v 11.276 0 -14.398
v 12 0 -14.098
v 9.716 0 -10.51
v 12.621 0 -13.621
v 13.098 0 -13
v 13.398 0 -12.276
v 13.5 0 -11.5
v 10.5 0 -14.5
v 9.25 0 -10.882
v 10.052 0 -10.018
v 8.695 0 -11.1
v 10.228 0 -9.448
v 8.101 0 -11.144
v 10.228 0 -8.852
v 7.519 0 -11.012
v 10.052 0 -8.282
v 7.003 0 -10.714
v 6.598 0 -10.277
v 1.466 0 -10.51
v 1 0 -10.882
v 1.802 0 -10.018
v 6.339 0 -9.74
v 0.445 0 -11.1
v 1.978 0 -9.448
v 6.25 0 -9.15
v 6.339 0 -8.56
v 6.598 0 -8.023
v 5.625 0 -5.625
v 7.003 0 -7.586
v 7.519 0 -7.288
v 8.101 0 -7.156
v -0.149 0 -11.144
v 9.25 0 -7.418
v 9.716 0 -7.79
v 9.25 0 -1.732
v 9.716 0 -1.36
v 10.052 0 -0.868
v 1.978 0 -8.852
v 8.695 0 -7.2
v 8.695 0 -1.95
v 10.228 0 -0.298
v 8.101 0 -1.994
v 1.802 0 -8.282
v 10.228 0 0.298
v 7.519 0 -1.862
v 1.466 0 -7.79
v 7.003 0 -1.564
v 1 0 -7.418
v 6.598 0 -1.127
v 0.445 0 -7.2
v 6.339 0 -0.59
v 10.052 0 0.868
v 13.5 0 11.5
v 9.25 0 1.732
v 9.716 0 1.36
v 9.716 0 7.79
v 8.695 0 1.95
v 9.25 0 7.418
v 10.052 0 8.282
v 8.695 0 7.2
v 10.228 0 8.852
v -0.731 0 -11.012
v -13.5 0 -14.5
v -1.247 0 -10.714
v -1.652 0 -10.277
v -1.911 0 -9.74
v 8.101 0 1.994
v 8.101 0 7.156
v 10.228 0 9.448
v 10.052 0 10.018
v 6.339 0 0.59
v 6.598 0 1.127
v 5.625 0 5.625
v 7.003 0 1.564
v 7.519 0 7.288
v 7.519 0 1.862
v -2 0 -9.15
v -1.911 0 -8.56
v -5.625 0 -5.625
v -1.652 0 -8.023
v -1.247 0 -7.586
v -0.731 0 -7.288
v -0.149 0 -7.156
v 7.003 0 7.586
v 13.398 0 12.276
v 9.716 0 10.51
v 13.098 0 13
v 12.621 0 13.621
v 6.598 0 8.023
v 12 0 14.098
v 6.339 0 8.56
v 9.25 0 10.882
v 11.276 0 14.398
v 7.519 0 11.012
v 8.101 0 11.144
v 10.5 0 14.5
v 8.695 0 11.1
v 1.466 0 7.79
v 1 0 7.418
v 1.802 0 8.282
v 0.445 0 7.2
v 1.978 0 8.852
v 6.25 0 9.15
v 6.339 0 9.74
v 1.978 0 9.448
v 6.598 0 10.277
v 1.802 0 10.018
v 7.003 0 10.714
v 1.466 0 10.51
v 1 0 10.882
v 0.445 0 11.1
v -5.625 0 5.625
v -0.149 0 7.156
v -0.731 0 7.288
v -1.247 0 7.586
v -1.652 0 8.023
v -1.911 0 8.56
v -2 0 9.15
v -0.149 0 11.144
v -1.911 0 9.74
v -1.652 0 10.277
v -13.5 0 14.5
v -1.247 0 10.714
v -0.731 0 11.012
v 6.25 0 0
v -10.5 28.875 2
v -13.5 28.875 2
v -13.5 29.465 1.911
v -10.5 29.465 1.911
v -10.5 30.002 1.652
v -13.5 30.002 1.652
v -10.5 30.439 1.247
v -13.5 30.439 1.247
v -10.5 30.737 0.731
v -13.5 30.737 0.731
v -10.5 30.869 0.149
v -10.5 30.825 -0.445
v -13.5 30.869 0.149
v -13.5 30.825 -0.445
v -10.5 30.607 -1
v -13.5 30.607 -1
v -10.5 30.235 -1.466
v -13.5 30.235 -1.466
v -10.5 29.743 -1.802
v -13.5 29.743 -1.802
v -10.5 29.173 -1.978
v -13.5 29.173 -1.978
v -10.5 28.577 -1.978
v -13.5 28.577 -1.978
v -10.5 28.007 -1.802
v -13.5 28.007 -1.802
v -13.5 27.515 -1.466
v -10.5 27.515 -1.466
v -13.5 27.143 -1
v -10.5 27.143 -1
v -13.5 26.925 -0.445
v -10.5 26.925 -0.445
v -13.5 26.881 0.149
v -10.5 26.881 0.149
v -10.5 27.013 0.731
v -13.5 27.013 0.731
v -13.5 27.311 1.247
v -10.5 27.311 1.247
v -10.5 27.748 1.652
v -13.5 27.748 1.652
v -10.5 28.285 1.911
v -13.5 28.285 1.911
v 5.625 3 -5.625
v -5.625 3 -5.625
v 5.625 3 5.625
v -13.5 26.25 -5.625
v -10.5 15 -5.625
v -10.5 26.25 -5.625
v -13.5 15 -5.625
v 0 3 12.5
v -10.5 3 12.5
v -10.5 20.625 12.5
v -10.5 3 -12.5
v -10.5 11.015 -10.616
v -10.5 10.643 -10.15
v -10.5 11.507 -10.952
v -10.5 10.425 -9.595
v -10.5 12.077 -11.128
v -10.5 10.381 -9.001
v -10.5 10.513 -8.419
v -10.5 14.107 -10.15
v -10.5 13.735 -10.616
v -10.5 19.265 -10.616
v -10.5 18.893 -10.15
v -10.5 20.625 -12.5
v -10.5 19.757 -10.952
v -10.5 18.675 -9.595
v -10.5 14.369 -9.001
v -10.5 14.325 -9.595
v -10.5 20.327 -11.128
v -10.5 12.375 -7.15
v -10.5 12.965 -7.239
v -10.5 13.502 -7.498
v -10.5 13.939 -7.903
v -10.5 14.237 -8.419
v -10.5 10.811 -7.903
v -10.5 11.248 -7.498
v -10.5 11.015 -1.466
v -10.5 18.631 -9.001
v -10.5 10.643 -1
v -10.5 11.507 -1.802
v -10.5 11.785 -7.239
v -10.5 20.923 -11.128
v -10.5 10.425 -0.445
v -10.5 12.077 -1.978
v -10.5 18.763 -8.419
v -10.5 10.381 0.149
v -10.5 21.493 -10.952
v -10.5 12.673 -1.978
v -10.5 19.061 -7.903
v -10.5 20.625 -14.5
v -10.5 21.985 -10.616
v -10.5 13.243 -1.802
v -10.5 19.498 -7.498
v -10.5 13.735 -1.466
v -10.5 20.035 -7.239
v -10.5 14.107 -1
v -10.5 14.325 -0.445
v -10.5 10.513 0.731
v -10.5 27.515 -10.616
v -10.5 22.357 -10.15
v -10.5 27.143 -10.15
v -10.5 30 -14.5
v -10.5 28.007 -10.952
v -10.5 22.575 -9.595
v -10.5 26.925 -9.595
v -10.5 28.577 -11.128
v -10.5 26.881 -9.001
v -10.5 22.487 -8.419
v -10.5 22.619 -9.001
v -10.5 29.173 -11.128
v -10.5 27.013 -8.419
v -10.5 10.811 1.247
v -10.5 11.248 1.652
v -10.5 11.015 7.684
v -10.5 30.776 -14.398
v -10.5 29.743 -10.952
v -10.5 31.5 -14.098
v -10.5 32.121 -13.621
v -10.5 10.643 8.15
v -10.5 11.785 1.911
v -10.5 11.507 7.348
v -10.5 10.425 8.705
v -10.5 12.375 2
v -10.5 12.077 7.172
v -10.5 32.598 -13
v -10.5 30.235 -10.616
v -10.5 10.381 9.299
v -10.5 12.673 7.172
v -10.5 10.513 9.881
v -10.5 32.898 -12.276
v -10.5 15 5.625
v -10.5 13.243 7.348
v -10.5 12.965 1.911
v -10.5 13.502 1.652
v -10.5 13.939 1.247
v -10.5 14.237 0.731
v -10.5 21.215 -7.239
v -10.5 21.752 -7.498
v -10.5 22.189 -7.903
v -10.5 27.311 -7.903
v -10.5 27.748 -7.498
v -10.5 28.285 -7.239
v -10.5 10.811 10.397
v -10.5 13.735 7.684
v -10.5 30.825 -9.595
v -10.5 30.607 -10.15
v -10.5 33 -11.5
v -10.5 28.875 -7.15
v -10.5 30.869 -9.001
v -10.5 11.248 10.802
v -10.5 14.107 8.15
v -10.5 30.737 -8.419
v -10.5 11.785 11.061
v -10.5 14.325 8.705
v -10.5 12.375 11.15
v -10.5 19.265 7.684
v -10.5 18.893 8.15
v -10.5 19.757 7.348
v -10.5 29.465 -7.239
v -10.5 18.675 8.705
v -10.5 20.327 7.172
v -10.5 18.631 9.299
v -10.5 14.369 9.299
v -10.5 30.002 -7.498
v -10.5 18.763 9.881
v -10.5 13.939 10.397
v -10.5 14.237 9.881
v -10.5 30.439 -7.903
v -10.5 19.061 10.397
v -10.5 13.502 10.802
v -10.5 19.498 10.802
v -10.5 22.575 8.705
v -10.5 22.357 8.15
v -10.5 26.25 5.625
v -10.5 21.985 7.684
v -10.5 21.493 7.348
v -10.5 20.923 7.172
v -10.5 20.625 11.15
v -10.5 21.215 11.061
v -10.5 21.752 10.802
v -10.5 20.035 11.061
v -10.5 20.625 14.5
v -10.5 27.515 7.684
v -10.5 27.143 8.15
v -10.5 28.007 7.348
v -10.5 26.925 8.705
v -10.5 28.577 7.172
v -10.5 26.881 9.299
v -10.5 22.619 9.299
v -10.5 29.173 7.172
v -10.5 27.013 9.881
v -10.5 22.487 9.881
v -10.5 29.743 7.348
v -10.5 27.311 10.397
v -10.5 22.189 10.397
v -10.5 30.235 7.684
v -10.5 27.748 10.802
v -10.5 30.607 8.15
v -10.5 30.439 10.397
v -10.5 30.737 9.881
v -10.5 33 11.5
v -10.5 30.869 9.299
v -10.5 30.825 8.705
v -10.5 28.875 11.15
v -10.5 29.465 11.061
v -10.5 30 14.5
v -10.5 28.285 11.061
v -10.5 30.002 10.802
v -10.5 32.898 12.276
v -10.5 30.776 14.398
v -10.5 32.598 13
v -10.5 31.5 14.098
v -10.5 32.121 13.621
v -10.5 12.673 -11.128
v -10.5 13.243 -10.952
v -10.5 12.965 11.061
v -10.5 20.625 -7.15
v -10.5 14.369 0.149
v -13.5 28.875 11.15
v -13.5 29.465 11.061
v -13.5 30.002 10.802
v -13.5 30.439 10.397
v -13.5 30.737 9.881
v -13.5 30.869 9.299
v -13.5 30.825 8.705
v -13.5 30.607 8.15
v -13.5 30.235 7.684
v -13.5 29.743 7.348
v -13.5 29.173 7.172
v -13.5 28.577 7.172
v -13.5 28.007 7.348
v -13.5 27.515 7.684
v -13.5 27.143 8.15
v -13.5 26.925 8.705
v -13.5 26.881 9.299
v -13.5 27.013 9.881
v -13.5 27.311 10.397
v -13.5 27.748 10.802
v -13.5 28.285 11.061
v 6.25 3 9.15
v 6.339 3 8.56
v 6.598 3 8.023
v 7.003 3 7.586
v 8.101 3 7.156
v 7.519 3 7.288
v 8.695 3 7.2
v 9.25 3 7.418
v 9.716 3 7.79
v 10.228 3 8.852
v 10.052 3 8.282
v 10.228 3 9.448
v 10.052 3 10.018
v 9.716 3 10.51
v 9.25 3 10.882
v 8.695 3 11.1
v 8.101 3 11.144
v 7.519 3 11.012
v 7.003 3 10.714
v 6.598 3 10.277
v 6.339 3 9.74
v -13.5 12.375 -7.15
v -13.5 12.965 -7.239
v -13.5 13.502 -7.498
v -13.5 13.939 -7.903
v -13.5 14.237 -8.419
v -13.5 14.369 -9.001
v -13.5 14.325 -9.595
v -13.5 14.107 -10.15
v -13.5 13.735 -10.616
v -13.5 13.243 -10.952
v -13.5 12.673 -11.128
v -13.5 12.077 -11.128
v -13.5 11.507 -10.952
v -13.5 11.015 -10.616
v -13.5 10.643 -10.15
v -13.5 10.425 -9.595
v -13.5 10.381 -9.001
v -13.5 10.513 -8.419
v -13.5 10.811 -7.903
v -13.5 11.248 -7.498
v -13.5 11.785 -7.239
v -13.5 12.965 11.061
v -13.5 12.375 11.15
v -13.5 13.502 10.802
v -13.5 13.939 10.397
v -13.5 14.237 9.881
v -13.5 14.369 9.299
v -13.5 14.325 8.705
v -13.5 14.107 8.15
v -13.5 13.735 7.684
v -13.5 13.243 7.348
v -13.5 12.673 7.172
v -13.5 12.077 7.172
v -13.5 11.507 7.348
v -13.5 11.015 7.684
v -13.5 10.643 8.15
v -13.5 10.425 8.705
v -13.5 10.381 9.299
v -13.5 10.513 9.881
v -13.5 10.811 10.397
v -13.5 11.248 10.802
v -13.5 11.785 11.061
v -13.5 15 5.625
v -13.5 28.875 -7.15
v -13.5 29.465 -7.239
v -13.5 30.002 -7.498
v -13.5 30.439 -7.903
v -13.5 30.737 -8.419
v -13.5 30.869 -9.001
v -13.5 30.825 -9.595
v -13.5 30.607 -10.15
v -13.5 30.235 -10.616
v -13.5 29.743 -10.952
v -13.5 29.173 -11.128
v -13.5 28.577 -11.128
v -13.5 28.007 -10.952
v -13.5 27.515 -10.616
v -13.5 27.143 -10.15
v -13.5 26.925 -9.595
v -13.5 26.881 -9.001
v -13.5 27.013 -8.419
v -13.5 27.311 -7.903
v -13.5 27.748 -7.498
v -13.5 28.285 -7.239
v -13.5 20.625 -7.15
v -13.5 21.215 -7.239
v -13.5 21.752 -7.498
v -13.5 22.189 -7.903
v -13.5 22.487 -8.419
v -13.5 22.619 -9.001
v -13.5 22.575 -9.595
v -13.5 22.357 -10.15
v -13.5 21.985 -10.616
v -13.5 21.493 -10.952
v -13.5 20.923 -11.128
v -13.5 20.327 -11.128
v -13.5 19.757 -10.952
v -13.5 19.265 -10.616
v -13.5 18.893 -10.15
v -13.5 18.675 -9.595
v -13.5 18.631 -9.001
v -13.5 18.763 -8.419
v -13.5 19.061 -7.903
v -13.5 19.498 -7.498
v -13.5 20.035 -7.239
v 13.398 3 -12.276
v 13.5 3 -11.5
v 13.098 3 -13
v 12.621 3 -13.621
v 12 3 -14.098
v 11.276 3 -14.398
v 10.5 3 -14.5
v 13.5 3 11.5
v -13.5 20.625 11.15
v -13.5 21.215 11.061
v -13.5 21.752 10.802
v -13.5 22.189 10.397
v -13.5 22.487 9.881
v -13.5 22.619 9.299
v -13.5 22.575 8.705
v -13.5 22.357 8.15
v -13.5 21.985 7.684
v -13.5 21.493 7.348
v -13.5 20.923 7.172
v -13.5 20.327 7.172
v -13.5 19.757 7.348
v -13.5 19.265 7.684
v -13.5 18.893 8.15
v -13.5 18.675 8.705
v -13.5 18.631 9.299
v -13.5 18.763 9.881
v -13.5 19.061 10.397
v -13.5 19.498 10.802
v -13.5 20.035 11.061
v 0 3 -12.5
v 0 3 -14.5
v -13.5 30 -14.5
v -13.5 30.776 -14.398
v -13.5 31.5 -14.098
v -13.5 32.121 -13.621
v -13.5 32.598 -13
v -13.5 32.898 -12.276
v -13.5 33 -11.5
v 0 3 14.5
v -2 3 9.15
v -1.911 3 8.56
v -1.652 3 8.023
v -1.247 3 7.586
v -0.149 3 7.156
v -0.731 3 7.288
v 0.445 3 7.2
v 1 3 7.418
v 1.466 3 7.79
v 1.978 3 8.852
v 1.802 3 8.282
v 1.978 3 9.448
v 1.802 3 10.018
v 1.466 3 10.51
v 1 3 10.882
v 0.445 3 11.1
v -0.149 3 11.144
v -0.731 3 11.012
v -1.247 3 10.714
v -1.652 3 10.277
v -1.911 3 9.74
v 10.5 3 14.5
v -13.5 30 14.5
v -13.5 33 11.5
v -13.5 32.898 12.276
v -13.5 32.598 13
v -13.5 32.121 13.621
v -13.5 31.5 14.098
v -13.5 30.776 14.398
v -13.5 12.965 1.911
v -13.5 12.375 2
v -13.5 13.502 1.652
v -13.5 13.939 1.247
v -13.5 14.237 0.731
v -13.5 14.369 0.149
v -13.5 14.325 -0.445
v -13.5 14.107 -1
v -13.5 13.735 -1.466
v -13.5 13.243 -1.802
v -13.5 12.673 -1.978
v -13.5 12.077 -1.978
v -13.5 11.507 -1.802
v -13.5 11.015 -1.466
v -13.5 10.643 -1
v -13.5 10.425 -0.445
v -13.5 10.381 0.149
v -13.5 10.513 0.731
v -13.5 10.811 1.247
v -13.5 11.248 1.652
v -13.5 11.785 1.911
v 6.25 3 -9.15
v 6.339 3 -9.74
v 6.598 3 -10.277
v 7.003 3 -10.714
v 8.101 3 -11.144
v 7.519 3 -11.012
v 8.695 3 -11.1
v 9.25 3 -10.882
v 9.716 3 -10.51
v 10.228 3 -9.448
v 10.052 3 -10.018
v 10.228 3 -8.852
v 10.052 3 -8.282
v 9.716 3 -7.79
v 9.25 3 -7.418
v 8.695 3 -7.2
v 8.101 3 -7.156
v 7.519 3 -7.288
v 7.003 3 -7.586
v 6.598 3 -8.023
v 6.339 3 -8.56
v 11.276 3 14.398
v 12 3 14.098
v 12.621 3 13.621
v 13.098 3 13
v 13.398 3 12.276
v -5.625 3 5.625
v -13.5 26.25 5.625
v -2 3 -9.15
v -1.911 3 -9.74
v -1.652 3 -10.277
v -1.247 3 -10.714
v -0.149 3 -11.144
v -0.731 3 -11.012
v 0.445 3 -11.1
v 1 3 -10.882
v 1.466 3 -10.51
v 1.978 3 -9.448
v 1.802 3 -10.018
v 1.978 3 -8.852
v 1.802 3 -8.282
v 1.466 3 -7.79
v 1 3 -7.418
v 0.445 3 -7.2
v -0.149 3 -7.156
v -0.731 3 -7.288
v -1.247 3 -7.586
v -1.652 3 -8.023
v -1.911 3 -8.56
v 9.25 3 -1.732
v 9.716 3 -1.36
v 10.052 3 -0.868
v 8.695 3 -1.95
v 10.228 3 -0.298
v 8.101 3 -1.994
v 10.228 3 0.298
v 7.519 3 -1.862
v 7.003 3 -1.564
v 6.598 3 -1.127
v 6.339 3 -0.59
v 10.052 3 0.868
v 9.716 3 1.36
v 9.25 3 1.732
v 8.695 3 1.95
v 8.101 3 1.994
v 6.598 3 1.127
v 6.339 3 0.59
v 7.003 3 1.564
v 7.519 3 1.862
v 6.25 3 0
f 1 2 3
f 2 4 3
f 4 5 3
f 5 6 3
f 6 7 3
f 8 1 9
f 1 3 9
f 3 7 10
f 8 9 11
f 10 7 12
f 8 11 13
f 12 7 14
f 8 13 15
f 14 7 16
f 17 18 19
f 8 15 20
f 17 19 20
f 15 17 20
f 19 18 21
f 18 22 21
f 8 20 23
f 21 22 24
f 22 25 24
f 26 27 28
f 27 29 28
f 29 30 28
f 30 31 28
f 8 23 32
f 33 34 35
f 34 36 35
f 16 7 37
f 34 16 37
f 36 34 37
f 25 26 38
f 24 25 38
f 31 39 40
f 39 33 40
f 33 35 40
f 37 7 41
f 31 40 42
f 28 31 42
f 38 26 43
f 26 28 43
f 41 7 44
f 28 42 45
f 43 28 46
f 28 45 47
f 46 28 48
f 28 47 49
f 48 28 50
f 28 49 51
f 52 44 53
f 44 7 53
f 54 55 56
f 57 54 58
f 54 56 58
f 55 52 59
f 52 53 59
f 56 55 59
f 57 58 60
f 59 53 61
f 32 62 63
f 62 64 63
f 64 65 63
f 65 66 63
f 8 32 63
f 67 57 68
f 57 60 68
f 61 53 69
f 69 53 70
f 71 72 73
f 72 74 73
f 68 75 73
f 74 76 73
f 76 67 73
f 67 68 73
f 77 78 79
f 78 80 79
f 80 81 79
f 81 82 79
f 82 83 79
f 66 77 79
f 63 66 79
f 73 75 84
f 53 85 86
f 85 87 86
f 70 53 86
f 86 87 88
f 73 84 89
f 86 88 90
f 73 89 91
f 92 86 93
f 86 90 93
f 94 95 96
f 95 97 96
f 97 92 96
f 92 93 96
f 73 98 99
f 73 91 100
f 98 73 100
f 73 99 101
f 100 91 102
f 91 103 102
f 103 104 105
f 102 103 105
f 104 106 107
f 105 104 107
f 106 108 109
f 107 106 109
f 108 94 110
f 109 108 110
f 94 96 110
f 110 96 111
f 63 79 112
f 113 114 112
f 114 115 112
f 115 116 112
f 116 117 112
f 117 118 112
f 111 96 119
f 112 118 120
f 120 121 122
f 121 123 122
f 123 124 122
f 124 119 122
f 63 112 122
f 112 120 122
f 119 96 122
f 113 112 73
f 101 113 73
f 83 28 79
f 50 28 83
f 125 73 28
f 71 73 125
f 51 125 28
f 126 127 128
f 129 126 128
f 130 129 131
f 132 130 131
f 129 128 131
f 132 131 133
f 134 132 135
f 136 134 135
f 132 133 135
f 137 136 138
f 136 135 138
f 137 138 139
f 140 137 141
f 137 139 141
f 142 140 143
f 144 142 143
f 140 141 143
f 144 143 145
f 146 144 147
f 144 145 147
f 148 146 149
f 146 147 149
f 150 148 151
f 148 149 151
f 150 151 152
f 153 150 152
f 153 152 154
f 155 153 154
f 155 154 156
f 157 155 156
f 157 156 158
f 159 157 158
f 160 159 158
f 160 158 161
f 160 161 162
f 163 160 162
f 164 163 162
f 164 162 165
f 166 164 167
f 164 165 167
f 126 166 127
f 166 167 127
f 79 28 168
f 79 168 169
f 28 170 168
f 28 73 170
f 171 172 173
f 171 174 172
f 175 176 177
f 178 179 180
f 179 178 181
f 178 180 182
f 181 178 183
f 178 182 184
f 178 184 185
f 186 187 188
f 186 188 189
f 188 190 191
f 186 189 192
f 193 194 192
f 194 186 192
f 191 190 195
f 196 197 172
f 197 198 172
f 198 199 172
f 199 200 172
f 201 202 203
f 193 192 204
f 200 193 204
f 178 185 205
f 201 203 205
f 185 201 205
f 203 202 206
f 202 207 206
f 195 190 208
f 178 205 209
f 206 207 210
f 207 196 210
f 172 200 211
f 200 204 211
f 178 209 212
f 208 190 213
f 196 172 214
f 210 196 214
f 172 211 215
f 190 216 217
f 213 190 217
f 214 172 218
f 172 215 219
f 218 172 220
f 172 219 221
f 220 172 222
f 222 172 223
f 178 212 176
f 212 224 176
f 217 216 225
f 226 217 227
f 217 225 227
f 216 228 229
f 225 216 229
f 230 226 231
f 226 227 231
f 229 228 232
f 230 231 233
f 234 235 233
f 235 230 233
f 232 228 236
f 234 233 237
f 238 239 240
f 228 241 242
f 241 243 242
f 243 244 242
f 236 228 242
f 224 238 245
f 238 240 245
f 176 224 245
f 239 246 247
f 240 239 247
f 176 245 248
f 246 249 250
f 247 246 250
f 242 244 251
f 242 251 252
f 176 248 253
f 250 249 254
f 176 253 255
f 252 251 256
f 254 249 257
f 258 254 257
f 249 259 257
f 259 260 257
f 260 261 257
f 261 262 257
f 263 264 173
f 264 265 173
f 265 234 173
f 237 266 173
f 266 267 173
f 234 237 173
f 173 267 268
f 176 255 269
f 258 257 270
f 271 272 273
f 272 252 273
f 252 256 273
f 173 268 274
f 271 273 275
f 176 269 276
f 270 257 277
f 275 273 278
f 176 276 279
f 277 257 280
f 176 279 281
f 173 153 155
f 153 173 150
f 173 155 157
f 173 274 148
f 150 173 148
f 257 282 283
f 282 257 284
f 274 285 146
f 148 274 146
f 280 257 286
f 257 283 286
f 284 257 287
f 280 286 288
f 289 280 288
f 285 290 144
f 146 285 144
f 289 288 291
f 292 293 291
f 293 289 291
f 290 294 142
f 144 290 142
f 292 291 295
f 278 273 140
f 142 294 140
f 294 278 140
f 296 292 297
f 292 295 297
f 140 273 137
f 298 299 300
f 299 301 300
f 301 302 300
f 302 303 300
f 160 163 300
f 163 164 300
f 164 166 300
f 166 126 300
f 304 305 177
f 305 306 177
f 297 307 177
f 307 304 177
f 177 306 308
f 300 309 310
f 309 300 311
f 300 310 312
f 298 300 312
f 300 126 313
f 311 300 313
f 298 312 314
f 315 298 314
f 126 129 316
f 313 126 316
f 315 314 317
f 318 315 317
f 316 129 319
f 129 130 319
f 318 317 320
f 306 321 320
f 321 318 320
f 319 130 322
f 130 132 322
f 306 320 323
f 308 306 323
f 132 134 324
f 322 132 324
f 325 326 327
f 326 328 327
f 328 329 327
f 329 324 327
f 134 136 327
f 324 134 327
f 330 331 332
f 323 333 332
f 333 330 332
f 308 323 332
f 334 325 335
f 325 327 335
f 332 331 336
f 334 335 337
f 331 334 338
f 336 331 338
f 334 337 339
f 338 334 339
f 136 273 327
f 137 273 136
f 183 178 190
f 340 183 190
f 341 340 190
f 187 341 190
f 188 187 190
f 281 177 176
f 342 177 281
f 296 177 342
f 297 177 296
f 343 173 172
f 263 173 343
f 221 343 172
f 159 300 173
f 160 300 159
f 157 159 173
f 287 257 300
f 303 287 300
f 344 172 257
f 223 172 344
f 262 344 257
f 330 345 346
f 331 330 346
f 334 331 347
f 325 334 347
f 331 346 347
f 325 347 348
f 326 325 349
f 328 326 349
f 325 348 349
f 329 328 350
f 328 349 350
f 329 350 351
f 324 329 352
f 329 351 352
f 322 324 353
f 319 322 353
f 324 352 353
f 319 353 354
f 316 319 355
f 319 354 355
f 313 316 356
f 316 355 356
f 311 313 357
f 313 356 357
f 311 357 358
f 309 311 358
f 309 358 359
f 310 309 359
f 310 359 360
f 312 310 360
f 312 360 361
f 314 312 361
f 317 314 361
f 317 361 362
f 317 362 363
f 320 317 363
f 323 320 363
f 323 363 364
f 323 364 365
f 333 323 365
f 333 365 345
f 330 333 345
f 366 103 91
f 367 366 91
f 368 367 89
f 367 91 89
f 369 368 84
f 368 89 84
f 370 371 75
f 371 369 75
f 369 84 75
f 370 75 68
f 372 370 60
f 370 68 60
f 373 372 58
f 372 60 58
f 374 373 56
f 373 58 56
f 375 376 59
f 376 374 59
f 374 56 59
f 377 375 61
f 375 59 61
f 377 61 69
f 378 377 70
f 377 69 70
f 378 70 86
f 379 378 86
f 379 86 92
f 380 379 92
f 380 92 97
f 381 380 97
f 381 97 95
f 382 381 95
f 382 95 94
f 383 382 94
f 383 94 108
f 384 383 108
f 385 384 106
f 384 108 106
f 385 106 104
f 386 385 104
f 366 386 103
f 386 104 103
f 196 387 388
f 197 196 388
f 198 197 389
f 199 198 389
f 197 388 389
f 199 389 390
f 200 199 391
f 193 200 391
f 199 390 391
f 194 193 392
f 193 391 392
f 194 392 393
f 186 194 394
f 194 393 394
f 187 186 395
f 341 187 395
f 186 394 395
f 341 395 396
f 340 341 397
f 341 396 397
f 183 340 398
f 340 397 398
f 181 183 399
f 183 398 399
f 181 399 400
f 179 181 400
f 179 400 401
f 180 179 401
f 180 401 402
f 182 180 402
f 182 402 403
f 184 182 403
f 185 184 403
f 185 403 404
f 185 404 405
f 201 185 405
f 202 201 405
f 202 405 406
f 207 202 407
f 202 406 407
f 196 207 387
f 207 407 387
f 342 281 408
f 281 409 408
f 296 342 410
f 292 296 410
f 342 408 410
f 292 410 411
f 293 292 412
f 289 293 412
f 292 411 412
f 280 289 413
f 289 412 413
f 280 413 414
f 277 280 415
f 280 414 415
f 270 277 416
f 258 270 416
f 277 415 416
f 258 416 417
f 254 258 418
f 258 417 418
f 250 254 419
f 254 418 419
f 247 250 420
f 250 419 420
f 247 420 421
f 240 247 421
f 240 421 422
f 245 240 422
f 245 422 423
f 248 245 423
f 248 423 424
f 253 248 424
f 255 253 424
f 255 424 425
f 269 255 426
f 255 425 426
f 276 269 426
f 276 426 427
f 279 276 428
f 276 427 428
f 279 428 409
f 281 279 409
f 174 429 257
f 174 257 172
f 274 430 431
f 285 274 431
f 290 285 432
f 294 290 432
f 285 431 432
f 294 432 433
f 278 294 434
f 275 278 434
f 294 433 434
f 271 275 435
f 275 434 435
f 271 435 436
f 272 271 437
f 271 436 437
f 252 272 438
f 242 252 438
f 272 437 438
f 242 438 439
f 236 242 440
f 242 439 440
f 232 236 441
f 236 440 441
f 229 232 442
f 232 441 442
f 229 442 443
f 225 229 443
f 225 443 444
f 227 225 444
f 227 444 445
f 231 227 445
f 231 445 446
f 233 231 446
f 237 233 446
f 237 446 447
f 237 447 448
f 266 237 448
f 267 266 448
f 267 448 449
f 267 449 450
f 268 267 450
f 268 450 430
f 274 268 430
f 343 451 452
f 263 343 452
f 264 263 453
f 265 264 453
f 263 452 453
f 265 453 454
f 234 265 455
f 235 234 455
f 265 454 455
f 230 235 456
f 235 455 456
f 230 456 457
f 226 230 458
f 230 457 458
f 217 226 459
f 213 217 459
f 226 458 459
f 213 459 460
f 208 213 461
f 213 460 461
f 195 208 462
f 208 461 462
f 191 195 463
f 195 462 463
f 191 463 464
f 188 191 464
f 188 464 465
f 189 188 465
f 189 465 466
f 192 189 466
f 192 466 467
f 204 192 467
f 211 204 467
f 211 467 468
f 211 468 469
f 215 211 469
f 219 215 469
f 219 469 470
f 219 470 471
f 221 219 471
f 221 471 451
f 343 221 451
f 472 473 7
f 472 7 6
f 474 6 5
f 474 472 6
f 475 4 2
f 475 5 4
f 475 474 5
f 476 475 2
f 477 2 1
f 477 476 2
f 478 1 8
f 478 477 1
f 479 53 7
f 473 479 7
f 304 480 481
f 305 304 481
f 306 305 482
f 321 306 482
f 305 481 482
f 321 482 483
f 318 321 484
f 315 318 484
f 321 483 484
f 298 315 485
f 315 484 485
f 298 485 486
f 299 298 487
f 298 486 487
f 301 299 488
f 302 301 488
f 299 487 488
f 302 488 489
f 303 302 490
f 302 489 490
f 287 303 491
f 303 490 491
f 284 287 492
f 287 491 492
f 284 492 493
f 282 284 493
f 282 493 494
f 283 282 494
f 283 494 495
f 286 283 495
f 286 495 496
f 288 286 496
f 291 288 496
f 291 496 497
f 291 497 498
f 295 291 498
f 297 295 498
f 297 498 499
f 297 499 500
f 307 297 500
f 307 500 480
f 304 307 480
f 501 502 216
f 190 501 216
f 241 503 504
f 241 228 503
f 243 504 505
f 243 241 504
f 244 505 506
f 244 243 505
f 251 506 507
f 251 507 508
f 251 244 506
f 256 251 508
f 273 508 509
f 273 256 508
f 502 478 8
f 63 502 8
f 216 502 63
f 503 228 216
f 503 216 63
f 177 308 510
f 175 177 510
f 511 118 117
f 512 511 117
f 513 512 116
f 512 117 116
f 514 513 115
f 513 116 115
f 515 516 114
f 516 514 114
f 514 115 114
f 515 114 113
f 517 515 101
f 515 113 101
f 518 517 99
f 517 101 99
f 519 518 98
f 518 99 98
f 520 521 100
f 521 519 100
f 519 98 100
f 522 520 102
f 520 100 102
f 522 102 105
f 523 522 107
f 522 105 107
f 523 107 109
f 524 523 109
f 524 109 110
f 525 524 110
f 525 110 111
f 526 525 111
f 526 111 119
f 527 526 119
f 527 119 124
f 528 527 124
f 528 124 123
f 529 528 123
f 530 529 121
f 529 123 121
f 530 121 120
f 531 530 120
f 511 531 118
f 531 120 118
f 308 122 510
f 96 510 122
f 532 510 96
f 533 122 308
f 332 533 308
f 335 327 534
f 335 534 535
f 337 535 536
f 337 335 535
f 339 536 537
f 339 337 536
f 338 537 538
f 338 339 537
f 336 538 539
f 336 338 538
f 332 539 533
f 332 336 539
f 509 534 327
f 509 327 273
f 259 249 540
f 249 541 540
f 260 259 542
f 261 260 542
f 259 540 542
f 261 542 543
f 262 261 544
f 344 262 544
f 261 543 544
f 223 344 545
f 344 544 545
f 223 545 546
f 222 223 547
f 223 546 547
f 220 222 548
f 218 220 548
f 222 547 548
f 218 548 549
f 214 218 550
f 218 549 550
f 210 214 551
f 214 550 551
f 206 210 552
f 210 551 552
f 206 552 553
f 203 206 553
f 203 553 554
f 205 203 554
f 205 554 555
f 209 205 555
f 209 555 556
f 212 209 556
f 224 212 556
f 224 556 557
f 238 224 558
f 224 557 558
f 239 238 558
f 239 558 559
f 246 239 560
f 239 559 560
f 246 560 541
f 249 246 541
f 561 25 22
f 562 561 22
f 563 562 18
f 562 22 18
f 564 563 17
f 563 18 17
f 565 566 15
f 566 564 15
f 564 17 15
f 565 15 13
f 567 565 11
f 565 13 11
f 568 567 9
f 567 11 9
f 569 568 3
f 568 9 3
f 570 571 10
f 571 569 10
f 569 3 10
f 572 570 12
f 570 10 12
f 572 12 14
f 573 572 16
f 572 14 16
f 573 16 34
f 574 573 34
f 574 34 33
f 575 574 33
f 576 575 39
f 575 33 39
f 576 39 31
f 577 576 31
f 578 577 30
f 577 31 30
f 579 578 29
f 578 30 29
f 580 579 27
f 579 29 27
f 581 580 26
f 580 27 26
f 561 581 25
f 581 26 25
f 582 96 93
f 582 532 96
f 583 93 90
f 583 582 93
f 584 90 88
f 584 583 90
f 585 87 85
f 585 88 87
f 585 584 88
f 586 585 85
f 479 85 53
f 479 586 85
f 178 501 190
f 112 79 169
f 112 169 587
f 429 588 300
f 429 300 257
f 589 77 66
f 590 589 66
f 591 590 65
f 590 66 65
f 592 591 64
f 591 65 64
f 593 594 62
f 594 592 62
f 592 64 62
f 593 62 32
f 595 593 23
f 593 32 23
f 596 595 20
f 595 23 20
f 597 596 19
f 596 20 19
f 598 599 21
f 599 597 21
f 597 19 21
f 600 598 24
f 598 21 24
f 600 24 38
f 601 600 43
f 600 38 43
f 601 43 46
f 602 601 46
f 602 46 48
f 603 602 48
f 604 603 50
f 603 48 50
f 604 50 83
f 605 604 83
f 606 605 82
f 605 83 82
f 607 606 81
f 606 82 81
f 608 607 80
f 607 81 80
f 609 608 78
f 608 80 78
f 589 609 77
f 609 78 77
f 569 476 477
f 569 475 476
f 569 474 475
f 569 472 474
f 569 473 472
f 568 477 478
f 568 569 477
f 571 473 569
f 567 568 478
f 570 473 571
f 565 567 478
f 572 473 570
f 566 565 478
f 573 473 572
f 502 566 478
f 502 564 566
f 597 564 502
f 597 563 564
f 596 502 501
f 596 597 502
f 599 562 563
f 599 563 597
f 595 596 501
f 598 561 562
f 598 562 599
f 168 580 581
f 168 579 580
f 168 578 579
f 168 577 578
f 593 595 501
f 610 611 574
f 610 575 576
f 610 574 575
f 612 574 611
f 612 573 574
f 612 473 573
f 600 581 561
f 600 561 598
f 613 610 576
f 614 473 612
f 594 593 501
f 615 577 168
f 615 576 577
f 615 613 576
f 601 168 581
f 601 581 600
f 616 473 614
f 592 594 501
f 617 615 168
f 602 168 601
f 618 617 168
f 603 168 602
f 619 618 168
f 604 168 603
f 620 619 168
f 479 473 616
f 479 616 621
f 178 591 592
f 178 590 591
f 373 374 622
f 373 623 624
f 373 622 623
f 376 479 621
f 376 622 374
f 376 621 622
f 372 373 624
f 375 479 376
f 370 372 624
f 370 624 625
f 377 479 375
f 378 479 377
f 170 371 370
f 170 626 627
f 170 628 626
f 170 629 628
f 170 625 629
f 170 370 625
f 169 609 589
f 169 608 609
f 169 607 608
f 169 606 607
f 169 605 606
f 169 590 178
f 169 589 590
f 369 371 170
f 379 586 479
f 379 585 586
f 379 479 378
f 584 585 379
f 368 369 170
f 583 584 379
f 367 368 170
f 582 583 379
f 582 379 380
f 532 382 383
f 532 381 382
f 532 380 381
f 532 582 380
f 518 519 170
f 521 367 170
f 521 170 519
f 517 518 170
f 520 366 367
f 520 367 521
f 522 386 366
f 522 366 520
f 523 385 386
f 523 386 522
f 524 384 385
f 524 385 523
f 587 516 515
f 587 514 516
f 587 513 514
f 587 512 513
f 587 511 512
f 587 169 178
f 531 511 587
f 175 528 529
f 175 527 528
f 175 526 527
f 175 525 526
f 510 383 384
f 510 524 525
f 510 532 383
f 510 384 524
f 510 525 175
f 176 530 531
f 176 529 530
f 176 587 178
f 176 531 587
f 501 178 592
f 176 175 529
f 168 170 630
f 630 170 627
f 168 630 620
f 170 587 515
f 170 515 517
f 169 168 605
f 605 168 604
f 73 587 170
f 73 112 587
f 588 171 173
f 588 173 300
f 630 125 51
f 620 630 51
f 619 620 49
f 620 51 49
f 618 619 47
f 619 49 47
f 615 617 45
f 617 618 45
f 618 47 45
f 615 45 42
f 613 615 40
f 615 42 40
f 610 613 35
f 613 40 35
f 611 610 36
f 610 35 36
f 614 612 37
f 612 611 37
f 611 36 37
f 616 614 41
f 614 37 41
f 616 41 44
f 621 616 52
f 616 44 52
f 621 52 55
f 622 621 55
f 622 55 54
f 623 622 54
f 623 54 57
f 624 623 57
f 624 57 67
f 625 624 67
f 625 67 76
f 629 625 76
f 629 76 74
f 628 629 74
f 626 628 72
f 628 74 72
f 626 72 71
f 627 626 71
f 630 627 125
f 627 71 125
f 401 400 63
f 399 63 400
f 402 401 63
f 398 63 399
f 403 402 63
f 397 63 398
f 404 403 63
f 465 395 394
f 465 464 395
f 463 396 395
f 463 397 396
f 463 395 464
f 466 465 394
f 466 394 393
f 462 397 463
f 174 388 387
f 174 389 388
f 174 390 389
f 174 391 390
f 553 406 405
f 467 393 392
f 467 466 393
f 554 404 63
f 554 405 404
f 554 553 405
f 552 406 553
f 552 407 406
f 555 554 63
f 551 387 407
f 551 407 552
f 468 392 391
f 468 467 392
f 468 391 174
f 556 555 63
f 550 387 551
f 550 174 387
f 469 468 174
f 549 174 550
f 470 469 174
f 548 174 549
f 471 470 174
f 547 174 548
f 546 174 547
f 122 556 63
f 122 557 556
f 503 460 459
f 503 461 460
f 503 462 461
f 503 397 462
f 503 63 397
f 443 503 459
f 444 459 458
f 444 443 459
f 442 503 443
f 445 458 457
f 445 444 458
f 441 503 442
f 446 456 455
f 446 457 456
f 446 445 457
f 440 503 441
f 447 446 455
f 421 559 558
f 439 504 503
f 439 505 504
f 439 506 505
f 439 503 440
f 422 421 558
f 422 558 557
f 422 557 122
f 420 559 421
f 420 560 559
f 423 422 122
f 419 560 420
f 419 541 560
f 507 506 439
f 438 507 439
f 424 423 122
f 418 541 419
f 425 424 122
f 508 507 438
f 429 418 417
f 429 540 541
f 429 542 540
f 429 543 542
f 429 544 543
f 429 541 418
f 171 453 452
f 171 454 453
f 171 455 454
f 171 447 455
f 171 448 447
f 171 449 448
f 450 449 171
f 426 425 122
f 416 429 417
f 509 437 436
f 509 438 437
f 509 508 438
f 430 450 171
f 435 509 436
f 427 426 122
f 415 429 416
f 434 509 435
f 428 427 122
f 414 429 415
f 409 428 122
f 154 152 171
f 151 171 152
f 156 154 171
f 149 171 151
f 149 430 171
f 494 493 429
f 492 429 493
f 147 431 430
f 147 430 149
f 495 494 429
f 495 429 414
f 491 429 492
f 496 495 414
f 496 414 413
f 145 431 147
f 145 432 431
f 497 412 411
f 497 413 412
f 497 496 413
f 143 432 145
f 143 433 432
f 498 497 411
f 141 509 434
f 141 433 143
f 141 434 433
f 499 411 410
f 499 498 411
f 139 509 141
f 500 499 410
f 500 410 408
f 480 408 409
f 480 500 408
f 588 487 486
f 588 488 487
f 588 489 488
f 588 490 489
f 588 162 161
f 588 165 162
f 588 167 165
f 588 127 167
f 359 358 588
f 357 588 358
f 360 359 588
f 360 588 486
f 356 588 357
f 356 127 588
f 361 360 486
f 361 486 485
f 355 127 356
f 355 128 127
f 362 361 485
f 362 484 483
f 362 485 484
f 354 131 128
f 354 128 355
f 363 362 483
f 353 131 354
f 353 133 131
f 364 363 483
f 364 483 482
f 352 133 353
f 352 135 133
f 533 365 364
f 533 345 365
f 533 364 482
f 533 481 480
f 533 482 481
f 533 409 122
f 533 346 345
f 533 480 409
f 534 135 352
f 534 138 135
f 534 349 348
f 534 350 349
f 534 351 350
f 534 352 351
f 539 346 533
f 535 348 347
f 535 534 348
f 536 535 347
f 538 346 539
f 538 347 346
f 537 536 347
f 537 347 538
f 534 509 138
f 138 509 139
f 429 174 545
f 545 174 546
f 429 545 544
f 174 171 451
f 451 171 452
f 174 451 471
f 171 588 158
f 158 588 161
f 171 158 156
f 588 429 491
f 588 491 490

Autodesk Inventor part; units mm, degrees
ref_plane "YZ Plane" through (0, 0, 0) normal (1, 0, 0) x (0, 1, 0)
ref_plane "XZ Plane" through (0, 0, 0) normal (0, 1, 0) x (-1, 0, 0)
ref_plane "XY Plane" through (0, 0, 0) normal (0, 0, 1) x (1, 0, 0)
sketch "Sketch1" plane through (0, 0, 0) normal (0, 1, 0) x (-1, 0, 0)
  line L0 (13.5, 14.5) -> (-13.5, 14.5)
  line L1 (-13.5, 14.5) -> (-13.5, -14.5)
  line L2 (-13.5, -14.5) -> (13.5, -14.5)
  line L3 (13.5, -14.5) -> (13.5, 14.5)
  line L4 (5.625, 5.625) -> (-5.625, 5.625)
  line L5 (-5.625, 5.625) -> (-5.625, -5.625)
  line L6 (-5.625, -5.625) -> (5.625, -5.625)
  line L7 (5.625, -5.625) -> (5.625, 5.625)
  circle A0 centre (-8.25, 0) radius 2
  circle A1 centre (-8.25, -9.15) radius 2
  line L8 (-8.25, 0) -> (-4.1919, 0) construction
  circle A2 centre (-8.25, 9.15) radius 2
  line L9 (-4.125, 12.0498) -> (-4.125, -8.6633) construction
  circle A3 centre (0, -9.15) radius 2
  circle A4 centre (0, 9.15) radius 2
  point P0 (0, 0)
  point P1 (-4.125, 1.6932)
  dimension "d0" = 29
  dimension "d1" = 27
  dimension "d2" = 13.5
  dimension "d3" = 14.5
  dimension "d4" = 11.25
  dimension "d5" = 11.25
  dimension "d6" = 5.625
  dimension "d7" = 5.625
  dimension "d8" = 4
  dimension "d9" = 5.25
  dimension "d10" = 4
  dimension "d12" = 5.35
  dimension "d13" = 4.125
  dimension "d23" = 2.625
  dimension "d40" = 9.15
  dimension "d41" = 8.25
extrude "Extrusion1" add sketch "Sketch1" along normal blind 3
fillet "Fillet1" radius 3 2 edges at (13.5, 1.5, 14.5) (13.5, 1.5, -14.5)
sketch "Sketch2" plane through (-13.5, 0, -14.5) normal (-1, 0, 0) x (0, 0, 1)
  line L0 (0, 0) -> (0, 3) projected
  line L1 (0, 0) -> (29, 0)
  line L2 (29, 0) -> (29, 33)
  line L3 (29, 33) -> (0, 33)
  line L4 (0, 33) -> (0, 0)
  line L5 (0, 3) -> (29, 3) projected
  line L6 (8.875, 26.25) -> (20.125, 26.25)
  line L7 (20.125, 26.25) -> (20.125, 15)
  line L8 (20.125, 15) -> (8.875, 15)
  line L9 (8.875, 15) -> (8.875, 26.25)
  circle A0 centre (14.5, 12.375) radius 2
  circle A1 centre (23.65, 12.375) radius 2
  line L10 (3.2403, 20.625) -> (27.5408, 20.625) construction
  line L11 (14.5, 12.375) -> (14.5, 30.5106) construction
  circle A2 centre (5.35, 12.375) radius 2
  circle A3 centre (14.5, 28.875) radius 2
  circle A4 centre (23.65, 28.875) radius 2
  circle A5 centre (5.35, 28.875) radius 2
  line L12 (2.8915, 16.5) -> (25.3317, 16.5) construction
  circle A6 centre (23.65, 28.875) radius 2
  circle A7 centre (5.35, 28.875) radius 2
  circle A8 centre (23.65, 20.625) radius 2
  circle A9 centre (5.35, 20.625) radius 2
  point P0 (14.5, 0)
  dimension "d17" = 29
  dimension "d18" = 33
  dimension "d19" = 11.25
  dimension "d20" = 11.25
  dimension "d21" = 12
  dimension "d22" = 8.875
  dimension "d24" = 4
  dimension "d25" = 2.625
  dimension "d26" = 4
  dimension "d27" = 5.35
  dimension "d28" = 0
  dimension "d29" = 5.625
  dimension "d30" = 5.625
  dimension "d31" = 8.25
  dimension "d32" = 4.125
extrude "Extrusion2" add sketch "Sketch2" against normal blind 3 contours L4 L3 L2 L5
fillet "Fillet2" radius 3 2 edges at (-12, 33, 14.5) (-12, 33, -14.5)
sketch "Sketch3" plane through (-13.5, 0, 14.5) normal (0, 0, 1) x (1, 0, 0)
  line L0 (0, 18.625) -> (0, 22.625) projected
  line L1 (11.5, 3) -> (15.5, 3) projected
  line L2 (3, 22.625) -> (3, 18.625) projected
  line L3 (3, 22.625) -> (3, 18.625) projected
  line L4 (3, 20.625) -> (13.5, 3)
  line L5 (19.125, 3) -> (7.875, 3) projected
  line L6 (3, 30) -> (3, 3) projected
  line L7 (3, 3) -> (24, 3) projected
  point P0 (13.5, 0)
extrude "Extrusion3" add sketch "Sketch3" against normal blind 2
sketch "Sketch4" plane through (10.5, 0, -14.5) normal (0, 0, -1) x (-1, 0, 0)
  line L0 (10.5, 3) -> (21, 20.625) projected
  line L1 (21, 20.625) -> (21, 3) projected
  line L2 (21, 3) -> (10.5, 3) projected
  point P0 (10.5, 0)
extrude "Extrusion4" add sketch "Sketch4" against normal blind 2
equation "\"d2\" = 0.5 * d1"
equation "\"d3\" = 0.5 * d0"
equation "\"d5\" = d4"
equation "\"d6\" = 0.5 * d5"
equation "\"d7\" = 0.5 * d4"
equation "\"d13\" = -0.5 * d9 + 0.5 * d2"
equation "\"d20\" = d19"
equation "\"d22\" = 0.5 * d17 - 0.5 * d19"
equation "\"d26\" = d24"
equation "\"d29\" = 0.5 * d20"
equation "\"d30\" = d29"
equation "\"d32\" = 0.5 * d31"
properties part number "SoporteUnion" material "Plastic, Opaque Black"
